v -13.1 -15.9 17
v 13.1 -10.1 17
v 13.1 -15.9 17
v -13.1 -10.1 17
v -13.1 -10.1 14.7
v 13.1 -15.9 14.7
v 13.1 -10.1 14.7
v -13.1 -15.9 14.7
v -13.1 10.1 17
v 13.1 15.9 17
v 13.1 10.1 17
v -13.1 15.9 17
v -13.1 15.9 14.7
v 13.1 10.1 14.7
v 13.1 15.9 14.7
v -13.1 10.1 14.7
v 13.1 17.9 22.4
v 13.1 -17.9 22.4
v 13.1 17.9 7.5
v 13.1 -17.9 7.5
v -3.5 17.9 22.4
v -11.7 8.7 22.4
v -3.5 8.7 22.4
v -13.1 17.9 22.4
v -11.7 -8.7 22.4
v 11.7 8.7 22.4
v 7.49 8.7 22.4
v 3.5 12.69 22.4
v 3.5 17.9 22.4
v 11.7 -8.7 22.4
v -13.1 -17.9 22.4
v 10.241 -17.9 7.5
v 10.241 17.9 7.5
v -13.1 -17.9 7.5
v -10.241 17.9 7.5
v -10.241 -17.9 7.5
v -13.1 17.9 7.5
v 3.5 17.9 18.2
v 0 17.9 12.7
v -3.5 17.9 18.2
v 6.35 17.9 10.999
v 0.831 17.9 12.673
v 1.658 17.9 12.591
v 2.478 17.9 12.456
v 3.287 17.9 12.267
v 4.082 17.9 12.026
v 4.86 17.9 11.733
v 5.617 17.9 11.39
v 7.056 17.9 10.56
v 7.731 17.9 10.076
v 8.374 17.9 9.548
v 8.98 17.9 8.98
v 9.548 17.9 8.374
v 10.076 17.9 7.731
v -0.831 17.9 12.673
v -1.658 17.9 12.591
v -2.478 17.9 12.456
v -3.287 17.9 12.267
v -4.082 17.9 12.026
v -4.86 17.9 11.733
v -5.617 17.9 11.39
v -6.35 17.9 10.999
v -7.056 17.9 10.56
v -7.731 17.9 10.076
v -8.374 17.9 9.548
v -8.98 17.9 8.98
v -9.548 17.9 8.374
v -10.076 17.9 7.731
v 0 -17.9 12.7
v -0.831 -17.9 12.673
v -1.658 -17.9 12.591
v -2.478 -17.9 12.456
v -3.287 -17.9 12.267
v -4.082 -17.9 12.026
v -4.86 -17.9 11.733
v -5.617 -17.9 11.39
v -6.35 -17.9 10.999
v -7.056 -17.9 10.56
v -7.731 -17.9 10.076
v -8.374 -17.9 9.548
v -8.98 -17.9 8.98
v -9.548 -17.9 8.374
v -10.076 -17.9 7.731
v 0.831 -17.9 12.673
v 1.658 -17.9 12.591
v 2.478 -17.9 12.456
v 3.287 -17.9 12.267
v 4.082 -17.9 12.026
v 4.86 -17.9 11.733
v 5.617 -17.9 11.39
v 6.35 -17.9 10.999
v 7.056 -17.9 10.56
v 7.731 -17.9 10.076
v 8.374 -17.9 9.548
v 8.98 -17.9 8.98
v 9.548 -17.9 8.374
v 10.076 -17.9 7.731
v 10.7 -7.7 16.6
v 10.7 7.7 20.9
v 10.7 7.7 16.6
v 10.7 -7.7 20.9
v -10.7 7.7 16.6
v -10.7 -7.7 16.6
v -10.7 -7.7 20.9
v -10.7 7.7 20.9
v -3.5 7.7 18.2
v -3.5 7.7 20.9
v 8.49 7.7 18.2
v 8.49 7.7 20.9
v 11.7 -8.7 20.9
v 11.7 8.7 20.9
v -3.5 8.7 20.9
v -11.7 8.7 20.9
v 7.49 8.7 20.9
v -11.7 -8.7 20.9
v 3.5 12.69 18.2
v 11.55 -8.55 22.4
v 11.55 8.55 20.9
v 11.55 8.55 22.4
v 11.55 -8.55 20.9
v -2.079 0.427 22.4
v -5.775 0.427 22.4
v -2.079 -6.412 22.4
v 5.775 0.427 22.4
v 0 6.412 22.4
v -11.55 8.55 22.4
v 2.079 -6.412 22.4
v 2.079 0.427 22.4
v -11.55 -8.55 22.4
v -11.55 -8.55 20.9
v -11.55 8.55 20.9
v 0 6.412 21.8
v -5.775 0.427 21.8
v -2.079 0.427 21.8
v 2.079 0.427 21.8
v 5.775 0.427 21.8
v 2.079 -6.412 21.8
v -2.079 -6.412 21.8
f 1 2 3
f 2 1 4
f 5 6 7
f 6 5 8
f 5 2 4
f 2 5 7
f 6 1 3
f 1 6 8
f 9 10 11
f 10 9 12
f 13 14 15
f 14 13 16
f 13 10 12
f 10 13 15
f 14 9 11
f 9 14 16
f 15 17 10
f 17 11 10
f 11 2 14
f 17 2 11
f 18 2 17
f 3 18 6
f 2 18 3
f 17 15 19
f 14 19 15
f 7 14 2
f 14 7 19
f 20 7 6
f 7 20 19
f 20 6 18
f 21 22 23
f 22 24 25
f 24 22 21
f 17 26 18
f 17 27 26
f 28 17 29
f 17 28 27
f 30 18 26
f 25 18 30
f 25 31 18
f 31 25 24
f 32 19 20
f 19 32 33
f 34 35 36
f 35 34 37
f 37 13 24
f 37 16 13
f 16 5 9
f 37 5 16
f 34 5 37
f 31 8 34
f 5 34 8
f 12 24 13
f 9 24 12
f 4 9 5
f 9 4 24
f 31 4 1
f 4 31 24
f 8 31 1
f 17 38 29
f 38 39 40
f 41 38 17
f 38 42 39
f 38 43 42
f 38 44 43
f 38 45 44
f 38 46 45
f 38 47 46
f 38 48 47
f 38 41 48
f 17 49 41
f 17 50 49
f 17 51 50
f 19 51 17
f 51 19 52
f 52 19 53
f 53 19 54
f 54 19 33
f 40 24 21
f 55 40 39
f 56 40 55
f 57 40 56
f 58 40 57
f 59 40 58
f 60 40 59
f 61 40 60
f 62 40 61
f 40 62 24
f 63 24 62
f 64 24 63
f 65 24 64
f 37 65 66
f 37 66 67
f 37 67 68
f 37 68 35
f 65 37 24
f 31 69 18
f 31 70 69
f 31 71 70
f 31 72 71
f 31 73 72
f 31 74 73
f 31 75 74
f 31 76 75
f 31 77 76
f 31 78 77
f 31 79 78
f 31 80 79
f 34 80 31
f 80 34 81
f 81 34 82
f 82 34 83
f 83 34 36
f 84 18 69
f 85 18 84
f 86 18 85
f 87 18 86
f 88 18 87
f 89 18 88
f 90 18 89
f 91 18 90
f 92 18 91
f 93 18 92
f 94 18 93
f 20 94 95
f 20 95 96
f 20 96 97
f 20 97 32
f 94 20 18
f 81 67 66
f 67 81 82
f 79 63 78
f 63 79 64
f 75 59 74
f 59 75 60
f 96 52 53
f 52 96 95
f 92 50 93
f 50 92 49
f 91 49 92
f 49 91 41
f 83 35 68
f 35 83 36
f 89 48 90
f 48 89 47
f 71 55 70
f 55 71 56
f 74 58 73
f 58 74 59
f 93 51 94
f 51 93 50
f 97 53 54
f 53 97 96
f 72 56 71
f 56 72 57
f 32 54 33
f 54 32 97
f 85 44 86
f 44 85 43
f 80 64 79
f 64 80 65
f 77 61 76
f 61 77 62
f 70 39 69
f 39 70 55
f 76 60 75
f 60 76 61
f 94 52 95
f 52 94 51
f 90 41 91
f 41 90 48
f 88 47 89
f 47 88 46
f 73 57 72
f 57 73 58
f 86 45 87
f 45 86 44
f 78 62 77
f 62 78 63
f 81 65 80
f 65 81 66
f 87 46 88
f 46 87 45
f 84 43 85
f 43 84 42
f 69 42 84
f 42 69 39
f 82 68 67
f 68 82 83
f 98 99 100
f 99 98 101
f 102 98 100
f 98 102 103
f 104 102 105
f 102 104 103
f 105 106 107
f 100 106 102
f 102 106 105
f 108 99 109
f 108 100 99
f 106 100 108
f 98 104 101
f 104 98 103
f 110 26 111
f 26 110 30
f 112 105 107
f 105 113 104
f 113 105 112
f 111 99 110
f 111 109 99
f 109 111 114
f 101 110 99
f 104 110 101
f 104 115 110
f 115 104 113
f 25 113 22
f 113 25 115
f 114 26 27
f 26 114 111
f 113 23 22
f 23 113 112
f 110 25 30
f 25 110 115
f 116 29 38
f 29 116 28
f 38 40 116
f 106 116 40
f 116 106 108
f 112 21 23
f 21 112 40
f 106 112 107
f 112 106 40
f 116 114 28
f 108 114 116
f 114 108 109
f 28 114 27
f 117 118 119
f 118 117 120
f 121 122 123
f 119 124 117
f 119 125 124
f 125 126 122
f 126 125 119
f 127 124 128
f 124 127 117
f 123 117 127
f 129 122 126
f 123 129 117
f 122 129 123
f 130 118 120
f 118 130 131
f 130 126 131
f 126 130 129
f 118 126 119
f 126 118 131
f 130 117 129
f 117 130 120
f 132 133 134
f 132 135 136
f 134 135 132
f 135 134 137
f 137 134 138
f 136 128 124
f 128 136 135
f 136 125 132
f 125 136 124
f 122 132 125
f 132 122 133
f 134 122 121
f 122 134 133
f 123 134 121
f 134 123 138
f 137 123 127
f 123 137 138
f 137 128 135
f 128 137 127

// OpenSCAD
// Holder for the GY-511 (LSM303D) compass module on a 25 mm antenna boom, fixed with zip ties.
// Datum: boom axis along Y through the origin, holder on top of the boom (+Z).
// The module Y arrow points along +Y (antenna front); the arrow on the lid shows it.
// Print the holder upside down (top face on the bed) and the lid flat, arrow up: no supports.

part = "assembly"; // "holder", "lid" or "assembly"

// --- Boom ---
pipe_d = 25;            // boom diameter
pipe_clearance = 0.2;   // per side
saddle_depth = 5;       // how far the saddle wraps down from the top of the boom

// --- GY-511 module (measured) ---
pcb_x = 21;             // long edge, across the boom
pcb_y = 15;             // short edge = module Y axis, along the boom
pcb_t = 1.6;            // PCB thickness
module_h = 4;           // total height incl. components and solder joints
pcb_clearance = 0.2;    // per side, glued in place
glue_gap = 0.3;         // between the module top and the lid

// --- Flat cable, leaves the long edge along the boom ---
cable_w = 6;
cable_t = 1.5;
cable_clearance = 0.5;  // per side
cable_side = 1;         // -1: cable leaves towards -Y (away from the arrow), +1: towards +Y
cable_chamfer = 5;      // 45 deg cut of the corner between pocket and groove, so an off-centre cable can turn in
cable_chamfer_side = 1;  // -1: corner on the -X side (left in top view with the groove up), +1: +X side

// --- Body ---
floor_t = 2.0;          // minimum between the boom and the pocket floor
wall = 2.4;             // pocket side walls (6 perimeters at 0.4 mm)

// --- Lid, sunk into a recess and glued ---
lid_t = 1.5;
lid_lip = 1.0;          // how far the lid overlaps the wall top
lid_clearance = 0.15;   // per side
arrow_depth = 0.6;      // engraved direction arrow

// --- Zip ties, run through closed tunnels above the boom: tightening pulls the holder down ---
strap_w = 5;            // up to 4.8 mm zip ties
strap_t = 1.5;
strap_clearance = 0.4;  // per side
strap_margin = 2.0;     // material between a tunnel and the holder end
tunnel_gap = 2.0;       // material between the boom and a tunnel, pressed down by the strap
groove_bridge = 1.2;    // material between the cable groove and the tunnel below it

eps = 0.01;
$fn = 96;

// --- Derived ---
pipe_r = pipe_d / 2 + pipe_clearance;
pocket_x = pcb_x + 2 * pcb_clearance;
pocket_y = pcb_y + 2 * pcb_clearance;
pocket_depth = module_h + glue_gap;
tunnel_h = strap_t + 2 * strap_clearance;
tunnel_bottom_z = pipe_r + tunnel_gap;
tunnel_top_z = tunnel_bottom_z + tunnel_h;
// The cable groove crosses over a tunnel, so the pocket is raised above it when needed
floor_z = max(pipe_r + floor_t, tunnel_top_z + groove_bridge - pcb_t);
recess_z = floor_z + pocket_depth;
top_z = recess_z + lid_t;
bottom_z = pipe_d / 2 - saddle_depth;

recess_x = pocket_x + 2 * lid_lip;
recess_y = pocket_y + 2 * lid_lip;
lid_x = recess_x - 2 * lid_clearance;
lid_y = recess_y - 2 * lid_clearance;

tunnel_y = strap_w + 2 * strap_clearance;
tunnel_center_y = pocket_y / 2 + wall + tunnel_y / 2;

body_x = pocket_x + 2 * wall;
body_y = 2 * (tunnel_center_y + tunnel_y / 2 + strap_margin);

cable_slot_w = cable_w + 2 * cable_clearance;
cable_floor_z = floor_z + pcb_t; // cable is soldered on top of the PCB

echo(body = [body_x, body_y, top_z - bottom_z], pocket = [pocket_x, pocket_y, pocket_depth],
     lid = [lid_x, lid_y, lid_t], top_z = top_z);

assert(wall - lid_lip >= 1.2, "recess wall too thin");
assert(cable_floor_z - tunnel_top_z >= groove_bridge - eps, "cable groove breaks into a strap tunnel");
assert(top_z - tunnel_top_z >= 2, "too little material above a strap tunnel");
assert(body_x / 2 > sqrt(pipe_r * pipe_r - bottom_z * bottom_z), "saddle wider than the body");
assert(cable_slot_w < pocket_x, "cable slot wider than the pocket");
assert(cable_slot_w / 2 + cable_chamfer <= pocket_x / 2, "cable chamfer runs past the pocket corner");
assert(pocket_y / 2 + cable_chamfer <= body_y / 2 - strap_margin, "cable chamfer reaches the holder end");

module holder() {
  difference() {
    translate([-body_x / 2, -body_y / 2, bottom_z])
      cube([body_x, body_y, top_z - bottom_z]);

    // Saddle
    rotate([90, 0, 0])
      cylinder(r = pipe_r, h = body_y + 2 * eps, center = true);

    // Module pocket
    translate([-pocket_x / 2, -pocket_y / 2, floor_z])
      cube([pocket_x, pocket_y, pocket_depth + eps]);

    // Lid recess
    translate([-recess_x / 2, -recess_y / 2, recess_z])
      cube([recess_x, recess_y, lid_t + eps]);

    // Closed zip tie tunnels across the body, above the boom
    for (s = [-1, 1])
      translate([-body_x / 2 - eps, s * tunnel_center_y - tunnel_y / 2, tunnel_bottom_z])
        cube([body_x + 2 * eps, tunnel_y, tunnel_h]);

    // Cable groove from the pocket to the holder end, along the boom
    translate([-cable_slot_w / 2,
               cable_side > 0 ? pocket_y / 2 - eps : -body_y / 2 - eps,
               cable_floor_z])
      cube([cable_slot_w, body_y / 2 - pocket_y / 2 + 2 * eps, top_z - cable_floor_z + eps]);

    // 45 deg chamfer of the pocket/groove corner, same depth as the groove
    translate([0, 0, cable_floor_z])
      mirror([cable_chamfer_side > 0 ? 1 : 0, 0, 0])
        mirror([0, cable_side > 0 ? 0 : 1, 0])
          linear_extrude(top_z - cable_floor_z + eps)
            polygon([[-cable_slot_w / 2 + eps, pocket_y / 2 - eps],
                     [-cable_slot_w / 2 - cable_chamfer, pocket_y / 2 - eps],
                     [-cable_slot_w / 2 + eps, pocket_y / 2 + cable_chamfer]]);
  }
}

module arrow_2d() {
  // Points to +Y; shaft and head scaled to the lid
  head_w = lid_x * 0.5;
  head_l = lid_y * 0.35;
  shaft_w = lid_x * 0.18;
  shaft_l = lid_y * 0.4;
  translate([0, -(head_l + shaft_l) / 2]) {
    translate([-shaft_w / 2, 0]) square([shaft_w, shaft_l + eps]);
    translate([0, shaft_l]) polygon([[-head_w / 2, 0], [head_w / 2, 0], [0, head_l]]);
  }
}

module lid() {
  difference() {
    translate([-lid_x / 2, -lid_y / 2, 0]) cube([lid_x, lid_y, lid_t]);
    translate([0, 0, lid_t - arrow_depth])
      linear_extrude(arrow_depth + eps) arrow_2d();
  }
}

if (part == "holder") {
  holder();
} else if (part == "lid") {
  lid();
} else {
  holder();
  translate([0, 0, recess_z]) lid();
  // Ghosts: boom and module
  %rotate([90, 0, 0]) cylinder(d = pipe_d, h = body_y * 2, center = true);
  %translate([-pcb_x / 2, -pcb_y / 2, floor_z]) cube([pcb_x, pcb_y, module_h]);
}
